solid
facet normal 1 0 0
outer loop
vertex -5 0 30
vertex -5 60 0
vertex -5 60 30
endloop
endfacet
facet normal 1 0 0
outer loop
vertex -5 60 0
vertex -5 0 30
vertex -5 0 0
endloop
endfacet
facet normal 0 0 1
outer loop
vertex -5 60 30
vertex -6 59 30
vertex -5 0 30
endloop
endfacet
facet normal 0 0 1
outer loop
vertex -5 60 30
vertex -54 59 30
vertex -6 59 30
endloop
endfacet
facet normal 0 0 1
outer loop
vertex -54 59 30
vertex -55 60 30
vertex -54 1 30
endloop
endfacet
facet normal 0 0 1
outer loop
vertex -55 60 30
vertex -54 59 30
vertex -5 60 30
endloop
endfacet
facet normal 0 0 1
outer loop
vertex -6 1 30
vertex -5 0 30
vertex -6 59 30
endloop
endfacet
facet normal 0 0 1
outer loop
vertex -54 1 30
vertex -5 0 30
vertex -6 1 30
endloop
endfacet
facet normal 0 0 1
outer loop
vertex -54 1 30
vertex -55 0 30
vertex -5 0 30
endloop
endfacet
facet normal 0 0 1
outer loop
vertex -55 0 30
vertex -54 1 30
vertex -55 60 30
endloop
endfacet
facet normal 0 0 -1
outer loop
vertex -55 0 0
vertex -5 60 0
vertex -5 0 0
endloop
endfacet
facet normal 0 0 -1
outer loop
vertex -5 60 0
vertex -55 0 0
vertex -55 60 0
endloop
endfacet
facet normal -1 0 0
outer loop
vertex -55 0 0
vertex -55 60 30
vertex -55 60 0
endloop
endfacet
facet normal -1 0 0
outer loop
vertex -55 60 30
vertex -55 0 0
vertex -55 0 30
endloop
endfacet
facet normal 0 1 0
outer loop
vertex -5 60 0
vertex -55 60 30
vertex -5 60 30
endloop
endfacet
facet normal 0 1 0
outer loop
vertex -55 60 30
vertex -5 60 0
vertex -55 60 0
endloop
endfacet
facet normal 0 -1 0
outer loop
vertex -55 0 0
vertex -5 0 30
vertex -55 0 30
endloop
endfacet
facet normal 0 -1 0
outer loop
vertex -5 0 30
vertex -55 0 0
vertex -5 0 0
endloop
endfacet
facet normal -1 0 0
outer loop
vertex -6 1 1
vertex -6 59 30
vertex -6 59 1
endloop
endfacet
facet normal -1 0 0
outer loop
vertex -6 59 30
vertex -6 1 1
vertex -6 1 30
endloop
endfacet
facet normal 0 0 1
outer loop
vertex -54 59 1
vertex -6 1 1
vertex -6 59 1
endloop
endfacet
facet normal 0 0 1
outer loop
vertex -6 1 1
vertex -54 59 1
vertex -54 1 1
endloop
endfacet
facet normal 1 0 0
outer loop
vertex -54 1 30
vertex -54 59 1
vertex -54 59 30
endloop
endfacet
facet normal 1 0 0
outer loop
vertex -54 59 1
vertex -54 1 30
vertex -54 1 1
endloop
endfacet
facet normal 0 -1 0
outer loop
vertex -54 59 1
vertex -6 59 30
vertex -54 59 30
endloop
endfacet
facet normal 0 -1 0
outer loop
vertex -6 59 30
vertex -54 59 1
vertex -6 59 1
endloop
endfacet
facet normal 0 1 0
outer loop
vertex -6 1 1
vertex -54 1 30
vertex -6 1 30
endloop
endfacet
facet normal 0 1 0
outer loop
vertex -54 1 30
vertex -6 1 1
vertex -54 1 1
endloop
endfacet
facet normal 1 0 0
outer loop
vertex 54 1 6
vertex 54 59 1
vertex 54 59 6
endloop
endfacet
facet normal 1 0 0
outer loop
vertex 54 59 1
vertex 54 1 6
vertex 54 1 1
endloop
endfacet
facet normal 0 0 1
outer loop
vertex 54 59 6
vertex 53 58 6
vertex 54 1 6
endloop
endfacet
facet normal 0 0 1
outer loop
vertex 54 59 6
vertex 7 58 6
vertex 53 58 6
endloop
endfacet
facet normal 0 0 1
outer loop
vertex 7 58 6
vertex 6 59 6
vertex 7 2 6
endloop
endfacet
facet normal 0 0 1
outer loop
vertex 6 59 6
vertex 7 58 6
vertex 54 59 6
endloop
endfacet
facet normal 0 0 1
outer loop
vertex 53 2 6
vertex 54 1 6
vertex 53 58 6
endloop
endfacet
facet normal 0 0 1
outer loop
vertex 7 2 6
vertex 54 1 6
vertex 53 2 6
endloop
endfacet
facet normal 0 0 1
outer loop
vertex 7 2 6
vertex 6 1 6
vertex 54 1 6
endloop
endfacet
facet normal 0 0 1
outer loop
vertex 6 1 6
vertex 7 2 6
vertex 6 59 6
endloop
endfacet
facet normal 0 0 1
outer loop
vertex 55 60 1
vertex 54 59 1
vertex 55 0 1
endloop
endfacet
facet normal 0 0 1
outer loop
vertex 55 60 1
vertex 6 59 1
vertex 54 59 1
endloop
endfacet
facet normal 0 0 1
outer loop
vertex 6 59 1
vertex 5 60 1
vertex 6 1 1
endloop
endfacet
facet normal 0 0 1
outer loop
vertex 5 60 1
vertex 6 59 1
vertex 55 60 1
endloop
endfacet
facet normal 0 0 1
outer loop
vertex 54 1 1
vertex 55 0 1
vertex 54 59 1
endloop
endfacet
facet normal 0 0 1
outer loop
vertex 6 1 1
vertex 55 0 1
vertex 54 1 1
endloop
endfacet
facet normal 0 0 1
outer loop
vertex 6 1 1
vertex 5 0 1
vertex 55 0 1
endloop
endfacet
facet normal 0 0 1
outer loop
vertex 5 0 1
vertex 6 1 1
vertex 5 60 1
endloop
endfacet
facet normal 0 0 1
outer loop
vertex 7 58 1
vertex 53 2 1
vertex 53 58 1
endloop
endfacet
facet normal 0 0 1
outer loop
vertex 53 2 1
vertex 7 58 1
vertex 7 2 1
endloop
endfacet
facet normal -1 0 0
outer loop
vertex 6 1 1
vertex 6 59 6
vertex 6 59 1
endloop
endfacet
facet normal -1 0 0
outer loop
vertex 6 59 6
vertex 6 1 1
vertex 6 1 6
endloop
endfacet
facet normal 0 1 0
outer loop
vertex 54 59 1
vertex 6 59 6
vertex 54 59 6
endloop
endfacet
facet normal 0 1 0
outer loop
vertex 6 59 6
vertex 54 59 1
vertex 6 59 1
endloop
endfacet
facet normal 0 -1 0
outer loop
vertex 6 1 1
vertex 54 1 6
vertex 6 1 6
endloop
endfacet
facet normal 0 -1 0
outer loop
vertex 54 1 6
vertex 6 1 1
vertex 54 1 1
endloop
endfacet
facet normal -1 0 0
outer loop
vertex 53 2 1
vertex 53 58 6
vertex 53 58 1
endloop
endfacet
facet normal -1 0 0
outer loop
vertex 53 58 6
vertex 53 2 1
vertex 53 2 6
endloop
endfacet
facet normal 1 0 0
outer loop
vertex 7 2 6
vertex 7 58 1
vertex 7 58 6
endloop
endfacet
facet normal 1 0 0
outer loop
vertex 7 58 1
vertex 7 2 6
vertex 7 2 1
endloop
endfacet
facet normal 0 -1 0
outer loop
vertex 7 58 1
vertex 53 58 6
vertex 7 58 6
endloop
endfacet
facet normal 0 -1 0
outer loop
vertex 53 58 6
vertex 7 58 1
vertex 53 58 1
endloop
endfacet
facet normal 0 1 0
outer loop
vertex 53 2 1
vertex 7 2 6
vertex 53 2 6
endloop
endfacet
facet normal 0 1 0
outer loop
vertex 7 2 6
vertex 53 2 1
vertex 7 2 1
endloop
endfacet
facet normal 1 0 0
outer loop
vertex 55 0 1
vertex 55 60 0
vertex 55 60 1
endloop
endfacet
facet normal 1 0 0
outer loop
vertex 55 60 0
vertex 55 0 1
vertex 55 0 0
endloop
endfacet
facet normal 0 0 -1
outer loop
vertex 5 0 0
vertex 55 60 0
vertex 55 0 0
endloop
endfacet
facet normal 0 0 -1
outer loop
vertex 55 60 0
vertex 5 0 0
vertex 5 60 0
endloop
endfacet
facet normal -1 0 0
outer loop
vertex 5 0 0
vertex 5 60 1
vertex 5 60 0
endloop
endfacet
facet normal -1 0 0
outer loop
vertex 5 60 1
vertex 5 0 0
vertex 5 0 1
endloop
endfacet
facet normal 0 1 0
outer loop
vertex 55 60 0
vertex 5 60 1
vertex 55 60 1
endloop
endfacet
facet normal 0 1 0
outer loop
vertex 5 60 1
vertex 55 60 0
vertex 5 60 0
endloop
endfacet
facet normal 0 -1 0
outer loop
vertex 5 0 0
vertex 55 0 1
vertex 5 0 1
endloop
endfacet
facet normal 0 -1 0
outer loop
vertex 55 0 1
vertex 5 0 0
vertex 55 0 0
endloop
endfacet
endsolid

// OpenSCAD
// file: ../../Primitives/box_main.scad
// MIT License

// Copyright (c) 2018 ut8uu

// Permission is hereby granted, free of charge, to any person obtaining a copy
// of this software and associated documentation files (the "Software"), to deal
// in the Software without restriction, including without limitation the rights
// to use, copy, modify, merge, publish, distribute, sublicense, and/or sell
// copies of the Software, and to permit persons to whom the Software is
// furnished to do so, subject to the following conditions:

// The above copyright notice and this permission notice shall be included in all
// copies or substantial portions of the Software.

// THE SOFTWARE IS PROVIDED "AS IS", WITHOUT WARRANTY OF ANY KIND, EXPRESS OR
// IMPLIED, INCLUDING BUT NOT LIMITED TO THE WARRANTIES OF MERCHANTABILITY,
// FITNESS FOR A PARTICULAR PURPOSE AND NONINFRINGEMENT. IN NO EVENT SHALL THE
// AUTHORS OR COPYRIGHT HOLDERS BE LIABLE FOR ANY CLAIM, DAMAGES OR OTHER
// LIABILITY, WHETHER IN AN ACTION OF CONTRACT, TORT OR OTHERWISE, ARISING FROM,
// OUT OF OR IN CONNECTION WITH THE SOFTWARE OR THE USE OR OTHER DEALINGS IN THE
// SOFTWARE.

// global variables
// $box_w - width (x)
// $box_d - depth (y)
// $box_h - height (z)
// $box_wall_thickness - thickness of the box' wall

// set the variable below to see the box in action
box_demo = true;

if (box_demo)
{
    // Global resolution
    $fs = 0.1;  // Don't generate smaller facets than 0.1 mm
    $fa = 5;    // Don't generate larger angles than 5 degrees
    
    $box_h = 30;
    $box_w = 50;
    $box_d = 60;
    $box_wall_thickness = 1;
    
    box_main();
}

module box_main()
{
    box_walls_9D04E7778521468E8EBB86C1C622761C();
    box_lid_163028402DBA46F1A57207ED46D87103();
}

module box_lid_163028402DBA46F1A57207ED46D87103()
{
    w = $box_w;
    h = $box_h;
    d = $box_d;
    ww = $box_wall_thickness;
    h2 = 5;

    translate([5,0,0])
    {
        cube([w,d,ww]);
        difference()
        {
            translate([ww,ww,ww])
                cube ([w-ww*2, d-ww*2, h2]);
            translate([ww*2,ww*2,ww-1])
                cube([w-ww*4, d-ww*4, h2+2]);
        }
    }
}


module box_walls_9D04E7778521468E8EBB86C1C622761C()
{
    w = $box_w;
    h = $box_h;
    d = $box_d;
    ww = $box_wall_thickness;
    translate([-5-w,0,0]){
        difference()
        {
            cube([w, d, h]);
            translate([ww,ww,ww])
                cube([w-ww*2, d-ww*2, h]);
        }
    }
}
// main file
include <../../Primitives/box_main.scad>
// Global resolution
$fs = 0.1;  // Don't generate smaller facets than 0.1 mm
$fa = 5;    // Don't generate larger angles than 5 degrees

brx_demo = false;

if (brx_demo)
{
    h = 30;
    w = 95;
    d = 70;
    ww = 2;
    stand = true;
    screw_diameter = 3;
    skirt = 3;
    radius = 6;

    translate([0, 5, 0])
        box_rounded_x(w,d,h,ww,stand,screw_diameter,skirt,radius);
    translate([0,-d-5,0])
        lid_rounded_x(w,d,h,ww,stand,screw_diameter,skirt,radius);

}

module box_rounded_x(w,d,h,ww,stand,screw_diameter,skirt,radius)
{
    box_rounded_walls(w,d,h,ww,stand,screw_diameter,skirt,radius);
}
module lid_rounded_x(w,d,h,ww,stand,screw_diameter,skirt,radius)
{
    box_rounded_lid(w,d,h,ww,stand,screw_diameter,skirt,radius);
}
